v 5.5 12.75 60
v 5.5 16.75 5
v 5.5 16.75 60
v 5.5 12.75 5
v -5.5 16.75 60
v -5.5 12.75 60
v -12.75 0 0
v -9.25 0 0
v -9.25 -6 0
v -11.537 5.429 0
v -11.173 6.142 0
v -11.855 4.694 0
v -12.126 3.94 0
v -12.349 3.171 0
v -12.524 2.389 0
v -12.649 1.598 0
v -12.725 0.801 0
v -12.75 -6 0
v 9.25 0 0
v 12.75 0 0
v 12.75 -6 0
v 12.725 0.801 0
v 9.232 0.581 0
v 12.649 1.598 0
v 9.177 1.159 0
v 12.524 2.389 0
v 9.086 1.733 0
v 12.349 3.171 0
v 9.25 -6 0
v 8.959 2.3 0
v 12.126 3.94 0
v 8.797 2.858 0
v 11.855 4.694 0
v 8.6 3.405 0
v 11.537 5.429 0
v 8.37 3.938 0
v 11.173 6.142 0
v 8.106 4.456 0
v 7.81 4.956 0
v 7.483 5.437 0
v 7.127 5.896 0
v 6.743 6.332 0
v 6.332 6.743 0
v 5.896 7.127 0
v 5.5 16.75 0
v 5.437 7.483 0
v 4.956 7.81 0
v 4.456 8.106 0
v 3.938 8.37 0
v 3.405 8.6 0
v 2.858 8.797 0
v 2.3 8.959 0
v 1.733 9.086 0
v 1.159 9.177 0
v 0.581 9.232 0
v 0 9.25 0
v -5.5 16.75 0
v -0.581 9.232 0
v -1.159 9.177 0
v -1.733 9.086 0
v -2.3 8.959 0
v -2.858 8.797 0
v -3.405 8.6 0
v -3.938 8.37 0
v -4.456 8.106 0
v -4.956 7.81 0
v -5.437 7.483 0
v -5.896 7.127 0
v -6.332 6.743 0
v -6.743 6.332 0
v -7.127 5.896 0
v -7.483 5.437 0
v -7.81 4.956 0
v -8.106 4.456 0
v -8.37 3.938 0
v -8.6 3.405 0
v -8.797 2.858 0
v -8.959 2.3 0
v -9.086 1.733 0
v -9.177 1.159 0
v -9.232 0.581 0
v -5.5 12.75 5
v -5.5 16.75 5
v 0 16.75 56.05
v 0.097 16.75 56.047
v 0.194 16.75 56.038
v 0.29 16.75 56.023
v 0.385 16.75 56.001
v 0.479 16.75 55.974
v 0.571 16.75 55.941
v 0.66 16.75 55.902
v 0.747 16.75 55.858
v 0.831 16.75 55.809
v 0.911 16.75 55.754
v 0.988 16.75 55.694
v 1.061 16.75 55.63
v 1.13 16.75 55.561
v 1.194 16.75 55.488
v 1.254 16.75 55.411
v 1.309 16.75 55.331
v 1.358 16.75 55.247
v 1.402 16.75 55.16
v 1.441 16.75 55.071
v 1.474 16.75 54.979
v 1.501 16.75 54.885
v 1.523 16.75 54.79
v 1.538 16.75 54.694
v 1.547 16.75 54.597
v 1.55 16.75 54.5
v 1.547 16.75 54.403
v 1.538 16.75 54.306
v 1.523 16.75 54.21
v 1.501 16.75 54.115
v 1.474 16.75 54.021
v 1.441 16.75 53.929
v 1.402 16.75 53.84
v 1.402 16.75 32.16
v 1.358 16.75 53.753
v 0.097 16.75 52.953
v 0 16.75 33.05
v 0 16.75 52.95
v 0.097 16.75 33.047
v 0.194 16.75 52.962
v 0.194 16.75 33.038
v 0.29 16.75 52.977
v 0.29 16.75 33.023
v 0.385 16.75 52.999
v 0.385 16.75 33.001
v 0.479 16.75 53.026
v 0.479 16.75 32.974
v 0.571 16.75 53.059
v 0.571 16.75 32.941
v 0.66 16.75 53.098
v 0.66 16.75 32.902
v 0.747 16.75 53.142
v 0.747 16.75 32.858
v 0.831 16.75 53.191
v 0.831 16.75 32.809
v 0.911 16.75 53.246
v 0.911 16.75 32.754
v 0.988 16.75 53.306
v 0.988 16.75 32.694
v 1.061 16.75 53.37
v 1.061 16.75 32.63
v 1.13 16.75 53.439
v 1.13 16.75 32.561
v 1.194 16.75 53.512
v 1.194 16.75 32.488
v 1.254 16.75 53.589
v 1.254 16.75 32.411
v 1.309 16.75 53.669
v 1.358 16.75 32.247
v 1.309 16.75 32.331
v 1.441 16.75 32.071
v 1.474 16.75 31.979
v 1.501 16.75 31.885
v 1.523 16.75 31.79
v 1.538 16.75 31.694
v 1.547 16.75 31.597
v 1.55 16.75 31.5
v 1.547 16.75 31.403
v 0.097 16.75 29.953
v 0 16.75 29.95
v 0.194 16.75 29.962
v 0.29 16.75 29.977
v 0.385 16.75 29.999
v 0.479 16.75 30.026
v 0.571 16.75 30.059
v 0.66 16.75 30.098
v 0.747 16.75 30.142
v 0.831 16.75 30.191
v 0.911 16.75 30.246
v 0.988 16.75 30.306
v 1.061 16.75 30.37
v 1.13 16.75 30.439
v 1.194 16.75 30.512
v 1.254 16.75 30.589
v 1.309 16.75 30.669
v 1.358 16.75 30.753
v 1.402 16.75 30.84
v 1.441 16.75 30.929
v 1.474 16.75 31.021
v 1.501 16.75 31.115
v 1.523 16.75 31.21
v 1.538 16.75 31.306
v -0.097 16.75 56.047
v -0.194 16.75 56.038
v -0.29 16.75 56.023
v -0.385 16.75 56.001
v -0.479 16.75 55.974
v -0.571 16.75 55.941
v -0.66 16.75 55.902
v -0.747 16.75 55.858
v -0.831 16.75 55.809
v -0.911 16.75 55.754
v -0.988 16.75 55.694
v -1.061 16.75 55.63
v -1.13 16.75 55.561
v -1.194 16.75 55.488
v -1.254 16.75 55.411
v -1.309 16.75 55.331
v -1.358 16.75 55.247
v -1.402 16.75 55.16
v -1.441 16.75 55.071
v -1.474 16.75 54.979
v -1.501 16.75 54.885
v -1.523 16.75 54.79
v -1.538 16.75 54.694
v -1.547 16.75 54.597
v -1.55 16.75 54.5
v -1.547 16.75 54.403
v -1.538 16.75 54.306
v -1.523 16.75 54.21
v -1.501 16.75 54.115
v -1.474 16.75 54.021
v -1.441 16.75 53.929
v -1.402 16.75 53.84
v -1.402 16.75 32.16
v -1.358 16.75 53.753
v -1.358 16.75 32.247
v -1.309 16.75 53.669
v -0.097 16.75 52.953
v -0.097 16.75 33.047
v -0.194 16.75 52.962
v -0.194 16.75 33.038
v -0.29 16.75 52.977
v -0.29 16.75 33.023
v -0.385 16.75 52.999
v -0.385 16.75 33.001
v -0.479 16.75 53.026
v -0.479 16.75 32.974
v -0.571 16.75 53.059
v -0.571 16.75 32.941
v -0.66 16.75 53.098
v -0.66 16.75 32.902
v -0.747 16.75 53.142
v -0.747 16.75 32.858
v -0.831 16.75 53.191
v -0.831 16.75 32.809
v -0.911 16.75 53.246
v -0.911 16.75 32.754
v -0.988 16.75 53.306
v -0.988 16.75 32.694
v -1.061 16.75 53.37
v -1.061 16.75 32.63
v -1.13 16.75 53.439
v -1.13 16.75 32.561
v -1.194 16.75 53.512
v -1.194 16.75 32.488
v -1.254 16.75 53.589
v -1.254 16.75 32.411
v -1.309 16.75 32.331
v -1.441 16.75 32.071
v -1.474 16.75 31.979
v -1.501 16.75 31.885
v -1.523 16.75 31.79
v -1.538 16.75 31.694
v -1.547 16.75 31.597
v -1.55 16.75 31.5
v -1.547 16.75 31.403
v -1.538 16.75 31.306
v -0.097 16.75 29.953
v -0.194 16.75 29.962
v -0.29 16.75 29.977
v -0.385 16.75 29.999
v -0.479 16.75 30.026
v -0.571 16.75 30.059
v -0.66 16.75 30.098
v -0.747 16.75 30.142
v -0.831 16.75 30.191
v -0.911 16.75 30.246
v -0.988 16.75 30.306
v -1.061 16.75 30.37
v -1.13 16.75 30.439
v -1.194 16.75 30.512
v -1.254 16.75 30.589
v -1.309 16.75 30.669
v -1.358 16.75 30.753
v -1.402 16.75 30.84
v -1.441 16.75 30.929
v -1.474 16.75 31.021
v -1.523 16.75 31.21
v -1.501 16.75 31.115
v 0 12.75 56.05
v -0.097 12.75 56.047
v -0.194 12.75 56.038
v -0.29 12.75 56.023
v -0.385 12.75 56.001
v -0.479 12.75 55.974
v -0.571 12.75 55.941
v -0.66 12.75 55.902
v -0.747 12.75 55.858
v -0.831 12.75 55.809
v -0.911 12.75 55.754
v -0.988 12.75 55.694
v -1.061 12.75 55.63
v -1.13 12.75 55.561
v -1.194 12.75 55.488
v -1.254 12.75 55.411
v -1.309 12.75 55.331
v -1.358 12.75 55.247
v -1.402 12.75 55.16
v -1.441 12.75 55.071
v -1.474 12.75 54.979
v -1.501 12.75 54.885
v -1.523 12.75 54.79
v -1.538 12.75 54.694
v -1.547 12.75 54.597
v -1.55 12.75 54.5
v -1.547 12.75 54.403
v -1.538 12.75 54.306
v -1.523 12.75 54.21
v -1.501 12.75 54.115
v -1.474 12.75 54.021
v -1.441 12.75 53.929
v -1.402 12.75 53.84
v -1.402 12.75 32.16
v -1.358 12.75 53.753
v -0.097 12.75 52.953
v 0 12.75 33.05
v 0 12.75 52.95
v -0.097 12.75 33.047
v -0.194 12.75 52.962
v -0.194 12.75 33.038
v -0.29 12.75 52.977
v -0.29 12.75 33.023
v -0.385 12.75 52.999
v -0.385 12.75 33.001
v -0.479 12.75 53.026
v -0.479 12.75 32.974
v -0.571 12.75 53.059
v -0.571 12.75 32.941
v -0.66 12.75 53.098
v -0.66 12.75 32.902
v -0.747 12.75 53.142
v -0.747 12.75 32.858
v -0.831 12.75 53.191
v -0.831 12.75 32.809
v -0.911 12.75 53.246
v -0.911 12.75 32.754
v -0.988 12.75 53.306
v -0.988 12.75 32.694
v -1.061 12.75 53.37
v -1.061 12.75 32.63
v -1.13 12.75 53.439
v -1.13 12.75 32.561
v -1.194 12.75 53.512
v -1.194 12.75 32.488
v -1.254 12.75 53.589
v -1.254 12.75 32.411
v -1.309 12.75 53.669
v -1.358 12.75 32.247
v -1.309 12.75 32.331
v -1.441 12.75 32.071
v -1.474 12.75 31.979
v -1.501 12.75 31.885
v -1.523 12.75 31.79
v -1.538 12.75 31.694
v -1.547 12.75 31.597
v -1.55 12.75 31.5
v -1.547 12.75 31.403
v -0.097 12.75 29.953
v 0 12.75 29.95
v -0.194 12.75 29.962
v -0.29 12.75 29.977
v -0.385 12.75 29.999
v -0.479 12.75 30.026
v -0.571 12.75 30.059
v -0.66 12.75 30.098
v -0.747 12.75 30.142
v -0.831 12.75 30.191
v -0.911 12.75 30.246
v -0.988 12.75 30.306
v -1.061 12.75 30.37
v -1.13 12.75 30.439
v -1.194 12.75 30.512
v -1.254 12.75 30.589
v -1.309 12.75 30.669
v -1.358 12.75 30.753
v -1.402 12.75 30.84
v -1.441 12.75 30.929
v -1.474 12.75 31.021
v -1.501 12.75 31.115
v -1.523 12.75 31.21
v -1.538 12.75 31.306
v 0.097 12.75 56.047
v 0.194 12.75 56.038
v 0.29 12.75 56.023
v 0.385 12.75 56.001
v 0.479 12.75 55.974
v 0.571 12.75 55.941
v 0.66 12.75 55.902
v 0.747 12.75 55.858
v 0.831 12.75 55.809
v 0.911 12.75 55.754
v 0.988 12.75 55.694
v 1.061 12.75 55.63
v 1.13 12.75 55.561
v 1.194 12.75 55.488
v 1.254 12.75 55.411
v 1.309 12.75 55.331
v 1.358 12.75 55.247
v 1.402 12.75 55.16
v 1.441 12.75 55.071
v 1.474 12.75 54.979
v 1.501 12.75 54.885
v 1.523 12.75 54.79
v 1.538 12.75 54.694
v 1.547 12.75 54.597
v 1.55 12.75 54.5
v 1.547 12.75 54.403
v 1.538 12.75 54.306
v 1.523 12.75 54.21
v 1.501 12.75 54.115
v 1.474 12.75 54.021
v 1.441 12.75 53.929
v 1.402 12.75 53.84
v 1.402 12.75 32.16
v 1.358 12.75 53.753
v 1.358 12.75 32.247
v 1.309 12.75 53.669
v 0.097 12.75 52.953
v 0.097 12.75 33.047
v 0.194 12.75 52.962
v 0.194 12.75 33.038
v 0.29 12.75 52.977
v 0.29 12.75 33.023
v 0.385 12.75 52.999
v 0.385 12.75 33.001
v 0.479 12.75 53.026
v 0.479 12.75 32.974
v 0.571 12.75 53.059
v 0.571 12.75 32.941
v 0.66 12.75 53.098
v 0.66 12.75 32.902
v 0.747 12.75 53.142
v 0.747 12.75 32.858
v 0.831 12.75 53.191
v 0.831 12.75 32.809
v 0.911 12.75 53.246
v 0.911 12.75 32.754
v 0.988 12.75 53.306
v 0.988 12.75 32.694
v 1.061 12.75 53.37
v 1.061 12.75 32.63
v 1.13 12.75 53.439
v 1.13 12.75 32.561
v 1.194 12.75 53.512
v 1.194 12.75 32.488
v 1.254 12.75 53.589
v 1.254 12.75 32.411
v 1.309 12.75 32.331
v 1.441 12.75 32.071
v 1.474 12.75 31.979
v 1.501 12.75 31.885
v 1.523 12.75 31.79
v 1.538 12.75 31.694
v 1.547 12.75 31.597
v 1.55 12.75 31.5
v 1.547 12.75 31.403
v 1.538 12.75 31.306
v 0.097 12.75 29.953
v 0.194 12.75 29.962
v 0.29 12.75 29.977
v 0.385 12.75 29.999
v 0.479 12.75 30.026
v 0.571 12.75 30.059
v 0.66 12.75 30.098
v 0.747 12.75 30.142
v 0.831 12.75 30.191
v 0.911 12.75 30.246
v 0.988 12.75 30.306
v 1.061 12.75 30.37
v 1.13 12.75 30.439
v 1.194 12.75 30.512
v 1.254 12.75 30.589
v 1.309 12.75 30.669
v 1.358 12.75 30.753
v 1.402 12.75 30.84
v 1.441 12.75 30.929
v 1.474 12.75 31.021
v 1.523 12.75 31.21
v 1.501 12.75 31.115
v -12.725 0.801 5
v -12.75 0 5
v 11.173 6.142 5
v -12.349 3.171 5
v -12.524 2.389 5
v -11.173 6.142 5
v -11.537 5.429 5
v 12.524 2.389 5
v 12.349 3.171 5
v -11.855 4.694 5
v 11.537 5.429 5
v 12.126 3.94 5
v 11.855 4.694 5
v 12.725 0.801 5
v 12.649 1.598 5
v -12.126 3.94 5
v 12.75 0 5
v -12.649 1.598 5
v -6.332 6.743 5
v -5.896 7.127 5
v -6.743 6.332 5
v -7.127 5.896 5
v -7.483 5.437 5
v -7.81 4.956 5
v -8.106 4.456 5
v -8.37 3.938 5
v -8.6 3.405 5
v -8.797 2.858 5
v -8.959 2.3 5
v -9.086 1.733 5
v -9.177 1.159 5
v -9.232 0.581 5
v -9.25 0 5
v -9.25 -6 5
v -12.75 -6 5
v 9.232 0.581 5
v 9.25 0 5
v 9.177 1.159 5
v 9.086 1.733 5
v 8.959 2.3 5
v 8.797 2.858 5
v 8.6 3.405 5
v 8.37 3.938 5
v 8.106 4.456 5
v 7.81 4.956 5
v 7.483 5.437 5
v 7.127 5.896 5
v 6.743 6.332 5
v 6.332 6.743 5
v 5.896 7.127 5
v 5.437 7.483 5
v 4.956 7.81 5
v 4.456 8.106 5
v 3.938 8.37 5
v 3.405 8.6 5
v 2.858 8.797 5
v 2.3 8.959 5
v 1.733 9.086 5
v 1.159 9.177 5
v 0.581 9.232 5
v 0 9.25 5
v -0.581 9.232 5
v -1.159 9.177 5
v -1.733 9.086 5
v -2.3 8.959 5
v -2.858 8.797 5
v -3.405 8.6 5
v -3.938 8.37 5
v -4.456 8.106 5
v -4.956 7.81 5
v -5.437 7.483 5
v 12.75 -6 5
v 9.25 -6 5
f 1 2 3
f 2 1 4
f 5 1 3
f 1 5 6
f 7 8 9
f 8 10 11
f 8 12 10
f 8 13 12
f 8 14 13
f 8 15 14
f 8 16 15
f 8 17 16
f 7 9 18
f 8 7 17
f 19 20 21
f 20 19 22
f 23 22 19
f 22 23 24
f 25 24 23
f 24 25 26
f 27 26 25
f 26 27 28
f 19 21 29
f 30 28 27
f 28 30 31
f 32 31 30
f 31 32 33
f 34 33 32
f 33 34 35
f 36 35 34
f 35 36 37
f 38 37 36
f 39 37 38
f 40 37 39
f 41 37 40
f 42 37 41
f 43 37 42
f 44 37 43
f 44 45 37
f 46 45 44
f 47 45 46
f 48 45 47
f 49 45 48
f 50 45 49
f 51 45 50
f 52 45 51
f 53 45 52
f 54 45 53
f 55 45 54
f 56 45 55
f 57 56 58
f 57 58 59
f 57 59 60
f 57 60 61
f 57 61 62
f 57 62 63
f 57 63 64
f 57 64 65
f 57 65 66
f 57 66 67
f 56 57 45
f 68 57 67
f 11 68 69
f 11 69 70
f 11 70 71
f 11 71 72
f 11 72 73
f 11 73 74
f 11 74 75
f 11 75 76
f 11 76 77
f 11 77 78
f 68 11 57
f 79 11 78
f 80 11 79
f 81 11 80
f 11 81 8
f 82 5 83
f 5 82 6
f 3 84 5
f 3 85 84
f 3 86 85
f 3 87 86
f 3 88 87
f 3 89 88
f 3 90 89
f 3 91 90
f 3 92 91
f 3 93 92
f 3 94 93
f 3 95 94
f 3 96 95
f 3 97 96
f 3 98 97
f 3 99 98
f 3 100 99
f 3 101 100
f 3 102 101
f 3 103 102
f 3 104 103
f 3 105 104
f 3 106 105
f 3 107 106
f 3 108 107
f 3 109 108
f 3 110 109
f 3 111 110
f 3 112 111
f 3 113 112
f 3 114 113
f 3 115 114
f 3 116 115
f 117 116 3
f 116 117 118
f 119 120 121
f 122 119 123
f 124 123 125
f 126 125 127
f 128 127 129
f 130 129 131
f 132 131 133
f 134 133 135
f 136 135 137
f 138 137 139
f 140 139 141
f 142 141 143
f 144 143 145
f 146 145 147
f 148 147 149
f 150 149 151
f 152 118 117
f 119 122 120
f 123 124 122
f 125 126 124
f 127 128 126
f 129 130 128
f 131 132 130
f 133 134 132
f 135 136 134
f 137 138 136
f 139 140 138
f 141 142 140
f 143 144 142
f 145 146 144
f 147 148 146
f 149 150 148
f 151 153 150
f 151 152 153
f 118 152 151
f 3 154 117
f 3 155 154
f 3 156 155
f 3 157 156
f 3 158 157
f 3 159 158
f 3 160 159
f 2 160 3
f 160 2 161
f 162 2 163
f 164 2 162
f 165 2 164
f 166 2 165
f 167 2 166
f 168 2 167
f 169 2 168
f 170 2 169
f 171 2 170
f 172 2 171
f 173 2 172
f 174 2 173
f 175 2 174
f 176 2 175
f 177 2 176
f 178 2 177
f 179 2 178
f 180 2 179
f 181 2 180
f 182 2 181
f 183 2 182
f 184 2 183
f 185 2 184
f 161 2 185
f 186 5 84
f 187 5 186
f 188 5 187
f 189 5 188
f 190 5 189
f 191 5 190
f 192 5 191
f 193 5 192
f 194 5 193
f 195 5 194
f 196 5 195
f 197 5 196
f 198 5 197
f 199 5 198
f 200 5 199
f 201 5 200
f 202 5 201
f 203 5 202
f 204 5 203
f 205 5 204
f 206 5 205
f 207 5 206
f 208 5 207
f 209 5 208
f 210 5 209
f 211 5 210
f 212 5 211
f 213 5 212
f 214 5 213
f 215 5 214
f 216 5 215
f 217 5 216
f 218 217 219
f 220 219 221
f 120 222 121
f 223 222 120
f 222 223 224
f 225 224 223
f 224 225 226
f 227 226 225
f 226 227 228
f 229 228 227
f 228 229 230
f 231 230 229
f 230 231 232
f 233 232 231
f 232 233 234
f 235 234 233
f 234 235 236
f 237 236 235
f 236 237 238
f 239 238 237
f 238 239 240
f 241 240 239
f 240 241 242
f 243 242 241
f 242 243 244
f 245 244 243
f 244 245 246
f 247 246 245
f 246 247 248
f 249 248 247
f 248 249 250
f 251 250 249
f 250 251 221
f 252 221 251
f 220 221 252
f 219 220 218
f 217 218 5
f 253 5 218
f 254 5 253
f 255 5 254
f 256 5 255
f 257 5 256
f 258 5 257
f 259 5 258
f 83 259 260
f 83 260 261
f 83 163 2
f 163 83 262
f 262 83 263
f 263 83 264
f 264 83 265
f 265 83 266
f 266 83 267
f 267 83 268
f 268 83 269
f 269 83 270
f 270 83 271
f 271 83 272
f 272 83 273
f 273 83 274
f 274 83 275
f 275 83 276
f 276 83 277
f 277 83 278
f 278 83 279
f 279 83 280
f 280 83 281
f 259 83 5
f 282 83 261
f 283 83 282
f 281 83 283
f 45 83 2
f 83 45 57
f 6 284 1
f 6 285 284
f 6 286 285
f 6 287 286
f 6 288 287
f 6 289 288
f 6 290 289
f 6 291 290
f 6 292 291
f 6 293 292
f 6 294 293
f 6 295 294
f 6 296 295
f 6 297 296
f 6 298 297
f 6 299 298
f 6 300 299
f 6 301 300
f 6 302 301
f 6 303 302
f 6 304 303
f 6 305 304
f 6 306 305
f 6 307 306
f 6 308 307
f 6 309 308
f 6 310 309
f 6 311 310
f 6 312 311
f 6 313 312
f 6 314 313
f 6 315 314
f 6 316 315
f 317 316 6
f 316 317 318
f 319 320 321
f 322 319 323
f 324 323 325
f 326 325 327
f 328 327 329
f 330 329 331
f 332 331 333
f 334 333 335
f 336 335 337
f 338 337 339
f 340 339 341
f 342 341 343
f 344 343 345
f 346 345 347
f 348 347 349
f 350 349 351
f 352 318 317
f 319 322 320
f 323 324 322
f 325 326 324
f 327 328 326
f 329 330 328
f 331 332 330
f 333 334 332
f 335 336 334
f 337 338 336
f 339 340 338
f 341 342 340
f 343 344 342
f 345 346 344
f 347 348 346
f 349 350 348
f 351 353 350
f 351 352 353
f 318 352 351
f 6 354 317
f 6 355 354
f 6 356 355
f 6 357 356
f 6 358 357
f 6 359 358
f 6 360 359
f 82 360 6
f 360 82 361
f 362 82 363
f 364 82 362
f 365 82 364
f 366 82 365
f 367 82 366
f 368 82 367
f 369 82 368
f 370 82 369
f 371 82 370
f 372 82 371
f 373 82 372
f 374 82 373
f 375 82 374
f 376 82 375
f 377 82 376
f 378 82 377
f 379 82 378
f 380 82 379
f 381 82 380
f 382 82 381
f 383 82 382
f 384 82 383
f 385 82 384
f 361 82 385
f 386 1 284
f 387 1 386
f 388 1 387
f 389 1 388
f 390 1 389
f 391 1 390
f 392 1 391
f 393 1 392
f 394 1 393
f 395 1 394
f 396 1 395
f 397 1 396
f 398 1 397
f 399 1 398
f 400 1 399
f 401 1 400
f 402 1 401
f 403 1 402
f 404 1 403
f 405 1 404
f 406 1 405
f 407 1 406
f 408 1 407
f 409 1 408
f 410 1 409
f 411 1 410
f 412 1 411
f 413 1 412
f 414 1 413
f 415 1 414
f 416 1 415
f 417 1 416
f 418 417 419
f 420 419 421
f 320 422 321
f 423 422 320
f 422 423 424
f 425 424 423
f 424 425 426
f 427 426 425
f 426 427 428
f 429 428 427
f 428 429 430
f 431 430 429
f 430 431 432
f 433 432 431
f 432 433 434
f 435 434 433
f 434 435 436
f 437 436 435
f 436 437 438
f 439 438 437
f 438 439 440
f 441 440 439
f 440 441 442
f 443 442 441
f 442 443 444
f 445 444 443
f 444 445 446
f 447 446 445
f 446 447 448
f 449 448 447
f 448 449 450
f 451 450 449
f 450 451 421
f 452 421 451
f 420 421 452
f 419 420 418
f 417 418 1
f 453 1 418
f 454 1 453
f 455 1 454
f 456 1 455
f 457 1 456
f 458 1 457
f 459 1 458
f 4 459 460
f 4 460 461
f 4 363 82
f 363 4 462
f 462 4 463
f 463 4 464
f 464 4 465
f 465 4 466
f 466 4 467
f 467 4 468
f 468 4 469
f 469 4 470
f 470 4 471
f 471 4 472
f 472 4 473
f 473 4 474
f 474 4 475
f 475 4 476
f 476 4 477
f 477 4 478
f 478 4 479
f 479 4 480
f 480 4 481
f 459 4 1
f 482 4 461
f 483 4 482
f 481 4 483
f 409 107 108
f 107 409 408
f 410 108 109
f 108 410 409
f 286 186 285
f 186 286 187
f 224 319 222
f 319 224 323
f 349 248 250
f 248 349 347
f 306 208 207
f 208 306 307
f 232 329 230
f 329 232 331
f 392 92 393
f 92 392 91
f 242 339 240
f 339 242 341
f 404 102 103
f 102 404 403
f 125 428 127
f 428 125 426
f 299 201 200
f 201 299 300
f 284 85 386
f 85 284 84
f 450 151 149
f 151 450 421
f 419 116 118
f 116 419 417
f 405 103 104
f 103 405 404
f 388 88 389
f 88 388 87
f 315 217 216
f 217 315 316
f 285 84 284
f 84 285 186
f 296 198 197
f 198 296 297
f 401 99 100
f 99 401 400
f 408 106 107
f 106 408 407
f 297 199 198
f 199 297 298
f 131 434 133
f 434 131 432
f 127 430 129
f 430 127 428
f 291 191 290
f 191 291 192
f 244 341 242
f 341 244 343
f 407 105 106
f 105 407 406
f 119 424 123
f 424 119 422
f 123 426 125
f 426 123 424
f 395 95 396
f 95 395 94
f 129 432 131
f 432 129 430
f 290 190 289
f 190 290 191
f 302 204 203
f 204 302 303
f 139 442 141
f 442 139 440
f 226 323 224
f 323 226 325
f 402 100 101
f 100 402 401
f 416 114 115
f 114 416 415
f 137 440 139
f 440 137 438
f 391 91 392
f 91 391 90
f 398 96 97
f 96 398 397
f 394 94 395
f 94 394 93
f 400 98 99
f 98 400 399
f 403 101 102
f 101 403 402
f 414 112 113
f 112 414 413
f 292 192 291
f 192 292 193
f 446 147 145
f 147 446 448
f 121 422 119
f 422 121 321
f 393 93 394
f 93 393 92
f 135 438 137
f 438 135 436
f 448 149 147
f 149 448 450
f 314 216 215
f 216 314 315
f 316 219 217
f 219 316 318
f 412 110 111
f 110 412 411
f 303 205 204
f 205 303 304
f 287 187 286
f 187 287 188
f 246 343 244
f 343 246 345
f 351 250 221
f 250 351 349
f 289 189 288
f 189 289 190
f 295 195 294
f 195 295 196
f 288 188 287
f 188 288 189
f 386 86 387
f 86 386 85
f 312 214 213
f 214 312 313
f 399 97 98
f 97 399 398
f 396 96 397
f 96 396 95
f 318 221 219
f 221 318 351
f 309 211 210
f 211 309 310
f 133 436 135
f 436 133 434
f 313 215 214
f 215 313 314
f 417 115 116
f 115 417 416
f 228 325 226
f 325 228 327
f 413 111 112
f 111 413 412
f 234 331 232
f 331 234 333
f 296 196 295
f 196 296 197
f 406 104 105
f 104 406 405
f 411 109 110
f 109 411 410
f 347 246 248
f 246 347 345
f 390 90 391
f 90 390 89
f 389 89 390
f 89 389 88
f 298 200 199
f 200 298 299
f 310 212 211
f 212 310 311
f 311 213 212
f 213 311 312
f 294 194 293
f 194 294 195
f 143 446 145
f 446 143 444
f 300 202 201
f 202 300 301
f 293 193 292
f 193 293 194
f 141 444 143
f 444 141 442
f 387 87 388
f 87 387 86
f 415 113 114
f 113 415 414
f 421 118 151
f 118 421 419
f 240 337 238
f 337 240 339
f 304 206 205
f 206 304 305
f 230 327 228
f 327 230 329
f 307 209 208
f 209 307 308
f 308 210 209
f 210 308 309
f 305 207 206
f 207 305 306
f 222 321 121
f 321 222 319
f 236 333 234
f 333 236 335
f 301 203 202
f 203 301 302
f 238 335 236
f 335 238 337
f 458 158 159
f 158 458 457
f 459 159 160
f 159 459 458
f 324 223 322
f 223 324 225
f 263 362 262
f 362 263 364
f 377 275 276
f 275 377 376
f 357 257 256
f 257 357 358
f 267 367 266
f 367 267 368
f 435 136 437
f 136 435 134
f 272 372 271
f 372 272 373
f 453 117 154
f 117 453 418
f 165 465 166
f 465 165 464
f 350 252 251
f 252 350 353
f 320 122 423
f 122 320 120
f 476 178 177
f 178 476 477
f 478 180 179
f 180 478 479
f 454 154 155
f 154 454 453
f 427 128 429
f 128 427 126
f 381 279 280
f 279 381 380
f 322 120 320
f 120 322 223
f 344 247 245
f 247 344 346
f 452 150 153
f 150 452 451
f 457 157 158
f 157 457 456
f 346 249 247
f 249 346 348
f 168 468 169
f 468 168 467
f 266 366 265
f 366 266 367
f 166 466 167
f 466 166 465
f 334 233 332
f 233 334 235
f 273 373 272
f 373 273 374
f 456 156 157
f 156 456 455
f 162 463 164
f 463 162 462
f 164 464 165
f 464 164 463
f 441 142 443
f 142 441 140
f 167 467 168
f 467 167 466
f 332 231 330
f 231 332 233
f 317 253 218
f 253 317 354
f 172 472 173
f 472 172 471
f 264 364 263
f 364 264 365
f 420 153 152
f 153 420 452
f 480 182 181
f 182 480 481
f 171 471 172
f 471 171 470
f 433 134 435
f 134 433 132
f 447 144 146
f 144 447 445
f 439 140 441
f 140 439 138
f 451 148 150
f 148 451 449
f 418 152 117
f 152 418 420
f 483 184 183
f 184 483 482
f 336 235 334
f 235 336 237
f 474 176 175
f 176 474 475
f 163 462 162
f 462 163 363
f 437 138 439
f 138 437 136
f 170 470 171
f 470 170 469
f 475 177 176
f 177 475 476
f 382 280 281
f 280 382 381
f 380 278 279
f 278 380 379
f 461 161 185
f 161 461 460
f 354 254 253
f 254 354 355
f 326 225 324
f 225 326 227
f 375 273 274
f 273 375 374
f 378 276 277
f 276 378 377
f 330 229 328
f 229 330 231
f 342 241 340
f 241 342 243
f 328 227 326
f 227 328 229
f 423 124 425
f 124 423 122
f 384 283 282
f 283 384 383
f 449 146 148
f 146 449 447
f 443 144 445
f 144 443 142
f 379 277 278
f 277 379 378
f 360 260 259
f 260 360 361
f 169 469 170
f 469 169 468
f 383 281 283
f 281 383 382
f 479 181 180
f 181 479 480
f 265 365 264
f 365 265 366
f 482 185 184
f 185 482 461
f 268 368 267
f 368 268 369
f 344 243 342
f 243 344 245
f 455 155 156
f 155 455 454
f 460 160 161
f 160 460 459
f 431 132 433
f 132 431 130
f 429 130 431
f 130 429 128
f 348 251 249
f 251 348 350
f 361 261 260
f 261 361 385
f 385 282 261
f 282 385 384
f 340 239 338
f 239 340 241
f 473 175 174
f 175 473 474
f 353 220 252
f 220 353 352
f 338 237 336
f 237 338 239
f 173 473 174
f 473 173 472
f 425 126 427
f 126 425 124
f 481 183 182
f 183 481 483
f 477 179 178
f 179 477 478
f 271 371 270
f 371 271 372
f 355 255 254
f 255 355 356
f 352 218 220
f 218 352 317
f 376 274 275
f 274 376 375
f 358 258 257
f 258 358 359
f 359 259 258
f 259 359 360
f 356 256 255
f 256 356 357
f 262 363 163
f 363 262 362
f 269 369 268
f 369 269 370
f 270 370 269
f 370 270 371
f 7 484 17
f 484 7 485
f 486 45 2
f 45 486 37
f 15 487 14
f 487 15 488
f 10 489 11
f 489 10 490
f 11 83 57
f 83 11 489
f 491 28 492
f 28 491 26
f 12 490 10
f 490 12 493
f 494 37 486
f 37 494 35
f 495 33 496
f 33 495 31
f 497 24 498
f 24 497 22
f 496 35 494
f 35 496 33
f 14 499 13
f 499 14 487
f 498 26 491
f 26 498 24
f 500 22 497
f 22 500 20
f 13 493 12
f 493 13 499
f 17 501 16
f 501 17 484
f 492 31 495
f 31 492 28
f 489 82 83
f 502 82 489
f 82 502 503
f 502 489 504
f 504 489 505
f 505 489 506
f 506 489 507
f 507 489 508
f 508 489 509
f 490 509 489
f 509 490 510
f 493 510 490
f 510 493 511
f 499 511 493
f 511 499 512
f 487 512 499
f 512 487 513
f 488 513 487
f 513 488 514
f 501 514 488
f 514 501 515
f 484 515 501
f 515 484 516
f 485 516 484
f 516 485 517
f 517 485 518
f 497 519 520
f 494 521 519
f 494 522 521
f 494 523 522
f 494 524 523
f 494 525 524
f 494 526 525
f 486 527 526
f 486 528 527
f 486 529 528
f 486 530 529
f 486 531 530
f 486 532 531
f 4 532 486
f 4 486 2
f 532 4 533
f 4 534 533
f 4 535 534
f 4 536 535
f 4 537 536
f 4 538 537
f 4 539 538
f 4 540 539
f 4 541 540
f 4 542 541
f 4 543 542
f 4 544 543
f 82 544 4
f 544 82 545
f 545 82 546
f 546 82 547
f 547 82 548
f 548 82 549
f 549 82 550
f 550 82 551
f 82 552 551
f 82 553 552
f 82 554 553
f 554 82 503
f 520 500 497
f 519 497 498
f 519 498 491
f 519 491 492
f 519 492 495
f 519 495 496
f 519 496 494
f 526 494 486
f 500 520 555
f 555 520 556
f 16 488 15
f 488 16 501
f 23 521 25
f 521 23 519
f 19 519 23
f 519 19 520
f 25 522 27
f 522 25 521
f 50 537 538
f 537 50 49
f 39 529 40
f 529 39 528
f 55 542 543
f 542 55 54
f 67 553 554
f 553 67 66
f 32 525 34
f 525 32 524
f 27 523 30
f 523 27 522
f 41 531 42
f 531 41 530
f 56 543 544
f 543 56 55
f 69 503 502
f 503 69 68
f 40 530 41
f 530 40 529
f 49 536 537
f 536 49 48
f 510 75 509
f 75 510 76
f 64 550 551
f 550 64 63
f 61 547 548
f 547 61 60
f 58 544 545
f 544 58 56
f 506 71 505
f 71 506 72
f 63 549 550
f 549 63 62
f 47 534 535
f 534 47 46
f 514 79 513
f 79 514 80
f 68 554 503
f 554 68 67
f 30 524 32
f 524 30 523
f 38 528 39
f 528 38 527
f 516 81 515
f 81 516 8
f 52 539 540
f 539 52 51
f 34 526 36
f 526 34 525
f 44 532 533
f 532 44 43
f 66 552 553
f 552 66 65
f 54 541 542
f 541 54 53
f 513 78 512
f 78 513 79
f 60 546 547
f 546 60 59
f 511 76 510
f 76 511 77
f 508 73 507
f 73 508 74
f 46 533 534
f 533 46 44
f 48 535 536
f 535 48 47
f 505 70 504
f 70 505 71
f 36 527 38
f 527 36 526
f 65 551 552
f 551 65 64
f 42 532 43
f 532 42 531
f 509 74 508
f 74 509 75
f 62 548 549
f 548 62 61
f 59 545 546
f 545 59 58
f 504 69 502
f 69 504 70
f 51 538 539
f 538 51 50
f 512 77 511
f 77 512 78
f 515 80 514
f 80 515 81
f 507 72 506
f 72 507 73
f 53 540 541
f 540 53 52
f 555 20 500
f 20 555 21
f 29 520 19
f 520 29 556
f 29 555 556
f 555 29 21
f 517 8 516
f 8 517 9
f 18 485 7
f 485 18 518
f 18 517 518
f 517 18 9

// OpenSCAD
// modified version of http://www.thingiverse.com/thing:1256069
// Auto Bed Leveling Probe Mount for the Robotdigg Aluminium Kossel Effector by Karatektus is licensed under the Creative Commons - Attribution license. 

$fn = 100;

length = 60;
diameter = 18.5;
thickness = 7;

height_of_plate=5;
height= 5;
depth = 4;

screw_diameter=3.1;

length_of_arm=6;

difference(){
    difference(){
        translate([0, (diameter/2)+(thickness/2)+depth/2, length/2]){
            cube([11, depth, length], center=true);
        }
        translate([0,(diameter/2)+(thickness/2)+(36/2)+depth-2,0]){
            //cylinder(r = 36/2, h=length); // hintere Abrundung
        }
        
    }
    translate([0, (diameter/2)+(thickness/2)+depth, length-(height_of_plate/2)-3]){
        rotate([90, 0, 0]){
            cylinder(r=screw_diameter/2, h=depth); // Schraubenloch 1
        }
    }
    translate([0, (diameter/2)+(thickness/2)+depth, length-(height_of_plate/2)-3-23]){
        rotate([90, 0, 0]){
            cylinder(r=screw_diameter/2, h=depth); // Schraubenloch 2
        }
    }

}
difference() {
    hull(){
        translate([0, (diameter/2)+(thickness/2), height / 2]){
            cube([11, 8, height], center=true);
        }

        difference() {
            cylinder(r = (diameter/2)+(thickness / 2), h = height);
            cylinder(r = diameter/2, h = height);
        }
    }
    cylinder(r = diameter/2, h = height);
    translate([0,-((diameter/2)+thickness)/2,height/2]){
        cube([diameter+thickness, (diameter/2)+thickness, height], center=true);
    }
}


// Addition to the front to allow for more mounting space
translate([diameter/2,-length_of_arm,0]){
     cube([thickness/2,length_of_arm,height]);
}
translate([-diameter/2-thickness/2,-length_of_arm,0]){
     cube([thickness/2,length_of_arm,height]);
}
